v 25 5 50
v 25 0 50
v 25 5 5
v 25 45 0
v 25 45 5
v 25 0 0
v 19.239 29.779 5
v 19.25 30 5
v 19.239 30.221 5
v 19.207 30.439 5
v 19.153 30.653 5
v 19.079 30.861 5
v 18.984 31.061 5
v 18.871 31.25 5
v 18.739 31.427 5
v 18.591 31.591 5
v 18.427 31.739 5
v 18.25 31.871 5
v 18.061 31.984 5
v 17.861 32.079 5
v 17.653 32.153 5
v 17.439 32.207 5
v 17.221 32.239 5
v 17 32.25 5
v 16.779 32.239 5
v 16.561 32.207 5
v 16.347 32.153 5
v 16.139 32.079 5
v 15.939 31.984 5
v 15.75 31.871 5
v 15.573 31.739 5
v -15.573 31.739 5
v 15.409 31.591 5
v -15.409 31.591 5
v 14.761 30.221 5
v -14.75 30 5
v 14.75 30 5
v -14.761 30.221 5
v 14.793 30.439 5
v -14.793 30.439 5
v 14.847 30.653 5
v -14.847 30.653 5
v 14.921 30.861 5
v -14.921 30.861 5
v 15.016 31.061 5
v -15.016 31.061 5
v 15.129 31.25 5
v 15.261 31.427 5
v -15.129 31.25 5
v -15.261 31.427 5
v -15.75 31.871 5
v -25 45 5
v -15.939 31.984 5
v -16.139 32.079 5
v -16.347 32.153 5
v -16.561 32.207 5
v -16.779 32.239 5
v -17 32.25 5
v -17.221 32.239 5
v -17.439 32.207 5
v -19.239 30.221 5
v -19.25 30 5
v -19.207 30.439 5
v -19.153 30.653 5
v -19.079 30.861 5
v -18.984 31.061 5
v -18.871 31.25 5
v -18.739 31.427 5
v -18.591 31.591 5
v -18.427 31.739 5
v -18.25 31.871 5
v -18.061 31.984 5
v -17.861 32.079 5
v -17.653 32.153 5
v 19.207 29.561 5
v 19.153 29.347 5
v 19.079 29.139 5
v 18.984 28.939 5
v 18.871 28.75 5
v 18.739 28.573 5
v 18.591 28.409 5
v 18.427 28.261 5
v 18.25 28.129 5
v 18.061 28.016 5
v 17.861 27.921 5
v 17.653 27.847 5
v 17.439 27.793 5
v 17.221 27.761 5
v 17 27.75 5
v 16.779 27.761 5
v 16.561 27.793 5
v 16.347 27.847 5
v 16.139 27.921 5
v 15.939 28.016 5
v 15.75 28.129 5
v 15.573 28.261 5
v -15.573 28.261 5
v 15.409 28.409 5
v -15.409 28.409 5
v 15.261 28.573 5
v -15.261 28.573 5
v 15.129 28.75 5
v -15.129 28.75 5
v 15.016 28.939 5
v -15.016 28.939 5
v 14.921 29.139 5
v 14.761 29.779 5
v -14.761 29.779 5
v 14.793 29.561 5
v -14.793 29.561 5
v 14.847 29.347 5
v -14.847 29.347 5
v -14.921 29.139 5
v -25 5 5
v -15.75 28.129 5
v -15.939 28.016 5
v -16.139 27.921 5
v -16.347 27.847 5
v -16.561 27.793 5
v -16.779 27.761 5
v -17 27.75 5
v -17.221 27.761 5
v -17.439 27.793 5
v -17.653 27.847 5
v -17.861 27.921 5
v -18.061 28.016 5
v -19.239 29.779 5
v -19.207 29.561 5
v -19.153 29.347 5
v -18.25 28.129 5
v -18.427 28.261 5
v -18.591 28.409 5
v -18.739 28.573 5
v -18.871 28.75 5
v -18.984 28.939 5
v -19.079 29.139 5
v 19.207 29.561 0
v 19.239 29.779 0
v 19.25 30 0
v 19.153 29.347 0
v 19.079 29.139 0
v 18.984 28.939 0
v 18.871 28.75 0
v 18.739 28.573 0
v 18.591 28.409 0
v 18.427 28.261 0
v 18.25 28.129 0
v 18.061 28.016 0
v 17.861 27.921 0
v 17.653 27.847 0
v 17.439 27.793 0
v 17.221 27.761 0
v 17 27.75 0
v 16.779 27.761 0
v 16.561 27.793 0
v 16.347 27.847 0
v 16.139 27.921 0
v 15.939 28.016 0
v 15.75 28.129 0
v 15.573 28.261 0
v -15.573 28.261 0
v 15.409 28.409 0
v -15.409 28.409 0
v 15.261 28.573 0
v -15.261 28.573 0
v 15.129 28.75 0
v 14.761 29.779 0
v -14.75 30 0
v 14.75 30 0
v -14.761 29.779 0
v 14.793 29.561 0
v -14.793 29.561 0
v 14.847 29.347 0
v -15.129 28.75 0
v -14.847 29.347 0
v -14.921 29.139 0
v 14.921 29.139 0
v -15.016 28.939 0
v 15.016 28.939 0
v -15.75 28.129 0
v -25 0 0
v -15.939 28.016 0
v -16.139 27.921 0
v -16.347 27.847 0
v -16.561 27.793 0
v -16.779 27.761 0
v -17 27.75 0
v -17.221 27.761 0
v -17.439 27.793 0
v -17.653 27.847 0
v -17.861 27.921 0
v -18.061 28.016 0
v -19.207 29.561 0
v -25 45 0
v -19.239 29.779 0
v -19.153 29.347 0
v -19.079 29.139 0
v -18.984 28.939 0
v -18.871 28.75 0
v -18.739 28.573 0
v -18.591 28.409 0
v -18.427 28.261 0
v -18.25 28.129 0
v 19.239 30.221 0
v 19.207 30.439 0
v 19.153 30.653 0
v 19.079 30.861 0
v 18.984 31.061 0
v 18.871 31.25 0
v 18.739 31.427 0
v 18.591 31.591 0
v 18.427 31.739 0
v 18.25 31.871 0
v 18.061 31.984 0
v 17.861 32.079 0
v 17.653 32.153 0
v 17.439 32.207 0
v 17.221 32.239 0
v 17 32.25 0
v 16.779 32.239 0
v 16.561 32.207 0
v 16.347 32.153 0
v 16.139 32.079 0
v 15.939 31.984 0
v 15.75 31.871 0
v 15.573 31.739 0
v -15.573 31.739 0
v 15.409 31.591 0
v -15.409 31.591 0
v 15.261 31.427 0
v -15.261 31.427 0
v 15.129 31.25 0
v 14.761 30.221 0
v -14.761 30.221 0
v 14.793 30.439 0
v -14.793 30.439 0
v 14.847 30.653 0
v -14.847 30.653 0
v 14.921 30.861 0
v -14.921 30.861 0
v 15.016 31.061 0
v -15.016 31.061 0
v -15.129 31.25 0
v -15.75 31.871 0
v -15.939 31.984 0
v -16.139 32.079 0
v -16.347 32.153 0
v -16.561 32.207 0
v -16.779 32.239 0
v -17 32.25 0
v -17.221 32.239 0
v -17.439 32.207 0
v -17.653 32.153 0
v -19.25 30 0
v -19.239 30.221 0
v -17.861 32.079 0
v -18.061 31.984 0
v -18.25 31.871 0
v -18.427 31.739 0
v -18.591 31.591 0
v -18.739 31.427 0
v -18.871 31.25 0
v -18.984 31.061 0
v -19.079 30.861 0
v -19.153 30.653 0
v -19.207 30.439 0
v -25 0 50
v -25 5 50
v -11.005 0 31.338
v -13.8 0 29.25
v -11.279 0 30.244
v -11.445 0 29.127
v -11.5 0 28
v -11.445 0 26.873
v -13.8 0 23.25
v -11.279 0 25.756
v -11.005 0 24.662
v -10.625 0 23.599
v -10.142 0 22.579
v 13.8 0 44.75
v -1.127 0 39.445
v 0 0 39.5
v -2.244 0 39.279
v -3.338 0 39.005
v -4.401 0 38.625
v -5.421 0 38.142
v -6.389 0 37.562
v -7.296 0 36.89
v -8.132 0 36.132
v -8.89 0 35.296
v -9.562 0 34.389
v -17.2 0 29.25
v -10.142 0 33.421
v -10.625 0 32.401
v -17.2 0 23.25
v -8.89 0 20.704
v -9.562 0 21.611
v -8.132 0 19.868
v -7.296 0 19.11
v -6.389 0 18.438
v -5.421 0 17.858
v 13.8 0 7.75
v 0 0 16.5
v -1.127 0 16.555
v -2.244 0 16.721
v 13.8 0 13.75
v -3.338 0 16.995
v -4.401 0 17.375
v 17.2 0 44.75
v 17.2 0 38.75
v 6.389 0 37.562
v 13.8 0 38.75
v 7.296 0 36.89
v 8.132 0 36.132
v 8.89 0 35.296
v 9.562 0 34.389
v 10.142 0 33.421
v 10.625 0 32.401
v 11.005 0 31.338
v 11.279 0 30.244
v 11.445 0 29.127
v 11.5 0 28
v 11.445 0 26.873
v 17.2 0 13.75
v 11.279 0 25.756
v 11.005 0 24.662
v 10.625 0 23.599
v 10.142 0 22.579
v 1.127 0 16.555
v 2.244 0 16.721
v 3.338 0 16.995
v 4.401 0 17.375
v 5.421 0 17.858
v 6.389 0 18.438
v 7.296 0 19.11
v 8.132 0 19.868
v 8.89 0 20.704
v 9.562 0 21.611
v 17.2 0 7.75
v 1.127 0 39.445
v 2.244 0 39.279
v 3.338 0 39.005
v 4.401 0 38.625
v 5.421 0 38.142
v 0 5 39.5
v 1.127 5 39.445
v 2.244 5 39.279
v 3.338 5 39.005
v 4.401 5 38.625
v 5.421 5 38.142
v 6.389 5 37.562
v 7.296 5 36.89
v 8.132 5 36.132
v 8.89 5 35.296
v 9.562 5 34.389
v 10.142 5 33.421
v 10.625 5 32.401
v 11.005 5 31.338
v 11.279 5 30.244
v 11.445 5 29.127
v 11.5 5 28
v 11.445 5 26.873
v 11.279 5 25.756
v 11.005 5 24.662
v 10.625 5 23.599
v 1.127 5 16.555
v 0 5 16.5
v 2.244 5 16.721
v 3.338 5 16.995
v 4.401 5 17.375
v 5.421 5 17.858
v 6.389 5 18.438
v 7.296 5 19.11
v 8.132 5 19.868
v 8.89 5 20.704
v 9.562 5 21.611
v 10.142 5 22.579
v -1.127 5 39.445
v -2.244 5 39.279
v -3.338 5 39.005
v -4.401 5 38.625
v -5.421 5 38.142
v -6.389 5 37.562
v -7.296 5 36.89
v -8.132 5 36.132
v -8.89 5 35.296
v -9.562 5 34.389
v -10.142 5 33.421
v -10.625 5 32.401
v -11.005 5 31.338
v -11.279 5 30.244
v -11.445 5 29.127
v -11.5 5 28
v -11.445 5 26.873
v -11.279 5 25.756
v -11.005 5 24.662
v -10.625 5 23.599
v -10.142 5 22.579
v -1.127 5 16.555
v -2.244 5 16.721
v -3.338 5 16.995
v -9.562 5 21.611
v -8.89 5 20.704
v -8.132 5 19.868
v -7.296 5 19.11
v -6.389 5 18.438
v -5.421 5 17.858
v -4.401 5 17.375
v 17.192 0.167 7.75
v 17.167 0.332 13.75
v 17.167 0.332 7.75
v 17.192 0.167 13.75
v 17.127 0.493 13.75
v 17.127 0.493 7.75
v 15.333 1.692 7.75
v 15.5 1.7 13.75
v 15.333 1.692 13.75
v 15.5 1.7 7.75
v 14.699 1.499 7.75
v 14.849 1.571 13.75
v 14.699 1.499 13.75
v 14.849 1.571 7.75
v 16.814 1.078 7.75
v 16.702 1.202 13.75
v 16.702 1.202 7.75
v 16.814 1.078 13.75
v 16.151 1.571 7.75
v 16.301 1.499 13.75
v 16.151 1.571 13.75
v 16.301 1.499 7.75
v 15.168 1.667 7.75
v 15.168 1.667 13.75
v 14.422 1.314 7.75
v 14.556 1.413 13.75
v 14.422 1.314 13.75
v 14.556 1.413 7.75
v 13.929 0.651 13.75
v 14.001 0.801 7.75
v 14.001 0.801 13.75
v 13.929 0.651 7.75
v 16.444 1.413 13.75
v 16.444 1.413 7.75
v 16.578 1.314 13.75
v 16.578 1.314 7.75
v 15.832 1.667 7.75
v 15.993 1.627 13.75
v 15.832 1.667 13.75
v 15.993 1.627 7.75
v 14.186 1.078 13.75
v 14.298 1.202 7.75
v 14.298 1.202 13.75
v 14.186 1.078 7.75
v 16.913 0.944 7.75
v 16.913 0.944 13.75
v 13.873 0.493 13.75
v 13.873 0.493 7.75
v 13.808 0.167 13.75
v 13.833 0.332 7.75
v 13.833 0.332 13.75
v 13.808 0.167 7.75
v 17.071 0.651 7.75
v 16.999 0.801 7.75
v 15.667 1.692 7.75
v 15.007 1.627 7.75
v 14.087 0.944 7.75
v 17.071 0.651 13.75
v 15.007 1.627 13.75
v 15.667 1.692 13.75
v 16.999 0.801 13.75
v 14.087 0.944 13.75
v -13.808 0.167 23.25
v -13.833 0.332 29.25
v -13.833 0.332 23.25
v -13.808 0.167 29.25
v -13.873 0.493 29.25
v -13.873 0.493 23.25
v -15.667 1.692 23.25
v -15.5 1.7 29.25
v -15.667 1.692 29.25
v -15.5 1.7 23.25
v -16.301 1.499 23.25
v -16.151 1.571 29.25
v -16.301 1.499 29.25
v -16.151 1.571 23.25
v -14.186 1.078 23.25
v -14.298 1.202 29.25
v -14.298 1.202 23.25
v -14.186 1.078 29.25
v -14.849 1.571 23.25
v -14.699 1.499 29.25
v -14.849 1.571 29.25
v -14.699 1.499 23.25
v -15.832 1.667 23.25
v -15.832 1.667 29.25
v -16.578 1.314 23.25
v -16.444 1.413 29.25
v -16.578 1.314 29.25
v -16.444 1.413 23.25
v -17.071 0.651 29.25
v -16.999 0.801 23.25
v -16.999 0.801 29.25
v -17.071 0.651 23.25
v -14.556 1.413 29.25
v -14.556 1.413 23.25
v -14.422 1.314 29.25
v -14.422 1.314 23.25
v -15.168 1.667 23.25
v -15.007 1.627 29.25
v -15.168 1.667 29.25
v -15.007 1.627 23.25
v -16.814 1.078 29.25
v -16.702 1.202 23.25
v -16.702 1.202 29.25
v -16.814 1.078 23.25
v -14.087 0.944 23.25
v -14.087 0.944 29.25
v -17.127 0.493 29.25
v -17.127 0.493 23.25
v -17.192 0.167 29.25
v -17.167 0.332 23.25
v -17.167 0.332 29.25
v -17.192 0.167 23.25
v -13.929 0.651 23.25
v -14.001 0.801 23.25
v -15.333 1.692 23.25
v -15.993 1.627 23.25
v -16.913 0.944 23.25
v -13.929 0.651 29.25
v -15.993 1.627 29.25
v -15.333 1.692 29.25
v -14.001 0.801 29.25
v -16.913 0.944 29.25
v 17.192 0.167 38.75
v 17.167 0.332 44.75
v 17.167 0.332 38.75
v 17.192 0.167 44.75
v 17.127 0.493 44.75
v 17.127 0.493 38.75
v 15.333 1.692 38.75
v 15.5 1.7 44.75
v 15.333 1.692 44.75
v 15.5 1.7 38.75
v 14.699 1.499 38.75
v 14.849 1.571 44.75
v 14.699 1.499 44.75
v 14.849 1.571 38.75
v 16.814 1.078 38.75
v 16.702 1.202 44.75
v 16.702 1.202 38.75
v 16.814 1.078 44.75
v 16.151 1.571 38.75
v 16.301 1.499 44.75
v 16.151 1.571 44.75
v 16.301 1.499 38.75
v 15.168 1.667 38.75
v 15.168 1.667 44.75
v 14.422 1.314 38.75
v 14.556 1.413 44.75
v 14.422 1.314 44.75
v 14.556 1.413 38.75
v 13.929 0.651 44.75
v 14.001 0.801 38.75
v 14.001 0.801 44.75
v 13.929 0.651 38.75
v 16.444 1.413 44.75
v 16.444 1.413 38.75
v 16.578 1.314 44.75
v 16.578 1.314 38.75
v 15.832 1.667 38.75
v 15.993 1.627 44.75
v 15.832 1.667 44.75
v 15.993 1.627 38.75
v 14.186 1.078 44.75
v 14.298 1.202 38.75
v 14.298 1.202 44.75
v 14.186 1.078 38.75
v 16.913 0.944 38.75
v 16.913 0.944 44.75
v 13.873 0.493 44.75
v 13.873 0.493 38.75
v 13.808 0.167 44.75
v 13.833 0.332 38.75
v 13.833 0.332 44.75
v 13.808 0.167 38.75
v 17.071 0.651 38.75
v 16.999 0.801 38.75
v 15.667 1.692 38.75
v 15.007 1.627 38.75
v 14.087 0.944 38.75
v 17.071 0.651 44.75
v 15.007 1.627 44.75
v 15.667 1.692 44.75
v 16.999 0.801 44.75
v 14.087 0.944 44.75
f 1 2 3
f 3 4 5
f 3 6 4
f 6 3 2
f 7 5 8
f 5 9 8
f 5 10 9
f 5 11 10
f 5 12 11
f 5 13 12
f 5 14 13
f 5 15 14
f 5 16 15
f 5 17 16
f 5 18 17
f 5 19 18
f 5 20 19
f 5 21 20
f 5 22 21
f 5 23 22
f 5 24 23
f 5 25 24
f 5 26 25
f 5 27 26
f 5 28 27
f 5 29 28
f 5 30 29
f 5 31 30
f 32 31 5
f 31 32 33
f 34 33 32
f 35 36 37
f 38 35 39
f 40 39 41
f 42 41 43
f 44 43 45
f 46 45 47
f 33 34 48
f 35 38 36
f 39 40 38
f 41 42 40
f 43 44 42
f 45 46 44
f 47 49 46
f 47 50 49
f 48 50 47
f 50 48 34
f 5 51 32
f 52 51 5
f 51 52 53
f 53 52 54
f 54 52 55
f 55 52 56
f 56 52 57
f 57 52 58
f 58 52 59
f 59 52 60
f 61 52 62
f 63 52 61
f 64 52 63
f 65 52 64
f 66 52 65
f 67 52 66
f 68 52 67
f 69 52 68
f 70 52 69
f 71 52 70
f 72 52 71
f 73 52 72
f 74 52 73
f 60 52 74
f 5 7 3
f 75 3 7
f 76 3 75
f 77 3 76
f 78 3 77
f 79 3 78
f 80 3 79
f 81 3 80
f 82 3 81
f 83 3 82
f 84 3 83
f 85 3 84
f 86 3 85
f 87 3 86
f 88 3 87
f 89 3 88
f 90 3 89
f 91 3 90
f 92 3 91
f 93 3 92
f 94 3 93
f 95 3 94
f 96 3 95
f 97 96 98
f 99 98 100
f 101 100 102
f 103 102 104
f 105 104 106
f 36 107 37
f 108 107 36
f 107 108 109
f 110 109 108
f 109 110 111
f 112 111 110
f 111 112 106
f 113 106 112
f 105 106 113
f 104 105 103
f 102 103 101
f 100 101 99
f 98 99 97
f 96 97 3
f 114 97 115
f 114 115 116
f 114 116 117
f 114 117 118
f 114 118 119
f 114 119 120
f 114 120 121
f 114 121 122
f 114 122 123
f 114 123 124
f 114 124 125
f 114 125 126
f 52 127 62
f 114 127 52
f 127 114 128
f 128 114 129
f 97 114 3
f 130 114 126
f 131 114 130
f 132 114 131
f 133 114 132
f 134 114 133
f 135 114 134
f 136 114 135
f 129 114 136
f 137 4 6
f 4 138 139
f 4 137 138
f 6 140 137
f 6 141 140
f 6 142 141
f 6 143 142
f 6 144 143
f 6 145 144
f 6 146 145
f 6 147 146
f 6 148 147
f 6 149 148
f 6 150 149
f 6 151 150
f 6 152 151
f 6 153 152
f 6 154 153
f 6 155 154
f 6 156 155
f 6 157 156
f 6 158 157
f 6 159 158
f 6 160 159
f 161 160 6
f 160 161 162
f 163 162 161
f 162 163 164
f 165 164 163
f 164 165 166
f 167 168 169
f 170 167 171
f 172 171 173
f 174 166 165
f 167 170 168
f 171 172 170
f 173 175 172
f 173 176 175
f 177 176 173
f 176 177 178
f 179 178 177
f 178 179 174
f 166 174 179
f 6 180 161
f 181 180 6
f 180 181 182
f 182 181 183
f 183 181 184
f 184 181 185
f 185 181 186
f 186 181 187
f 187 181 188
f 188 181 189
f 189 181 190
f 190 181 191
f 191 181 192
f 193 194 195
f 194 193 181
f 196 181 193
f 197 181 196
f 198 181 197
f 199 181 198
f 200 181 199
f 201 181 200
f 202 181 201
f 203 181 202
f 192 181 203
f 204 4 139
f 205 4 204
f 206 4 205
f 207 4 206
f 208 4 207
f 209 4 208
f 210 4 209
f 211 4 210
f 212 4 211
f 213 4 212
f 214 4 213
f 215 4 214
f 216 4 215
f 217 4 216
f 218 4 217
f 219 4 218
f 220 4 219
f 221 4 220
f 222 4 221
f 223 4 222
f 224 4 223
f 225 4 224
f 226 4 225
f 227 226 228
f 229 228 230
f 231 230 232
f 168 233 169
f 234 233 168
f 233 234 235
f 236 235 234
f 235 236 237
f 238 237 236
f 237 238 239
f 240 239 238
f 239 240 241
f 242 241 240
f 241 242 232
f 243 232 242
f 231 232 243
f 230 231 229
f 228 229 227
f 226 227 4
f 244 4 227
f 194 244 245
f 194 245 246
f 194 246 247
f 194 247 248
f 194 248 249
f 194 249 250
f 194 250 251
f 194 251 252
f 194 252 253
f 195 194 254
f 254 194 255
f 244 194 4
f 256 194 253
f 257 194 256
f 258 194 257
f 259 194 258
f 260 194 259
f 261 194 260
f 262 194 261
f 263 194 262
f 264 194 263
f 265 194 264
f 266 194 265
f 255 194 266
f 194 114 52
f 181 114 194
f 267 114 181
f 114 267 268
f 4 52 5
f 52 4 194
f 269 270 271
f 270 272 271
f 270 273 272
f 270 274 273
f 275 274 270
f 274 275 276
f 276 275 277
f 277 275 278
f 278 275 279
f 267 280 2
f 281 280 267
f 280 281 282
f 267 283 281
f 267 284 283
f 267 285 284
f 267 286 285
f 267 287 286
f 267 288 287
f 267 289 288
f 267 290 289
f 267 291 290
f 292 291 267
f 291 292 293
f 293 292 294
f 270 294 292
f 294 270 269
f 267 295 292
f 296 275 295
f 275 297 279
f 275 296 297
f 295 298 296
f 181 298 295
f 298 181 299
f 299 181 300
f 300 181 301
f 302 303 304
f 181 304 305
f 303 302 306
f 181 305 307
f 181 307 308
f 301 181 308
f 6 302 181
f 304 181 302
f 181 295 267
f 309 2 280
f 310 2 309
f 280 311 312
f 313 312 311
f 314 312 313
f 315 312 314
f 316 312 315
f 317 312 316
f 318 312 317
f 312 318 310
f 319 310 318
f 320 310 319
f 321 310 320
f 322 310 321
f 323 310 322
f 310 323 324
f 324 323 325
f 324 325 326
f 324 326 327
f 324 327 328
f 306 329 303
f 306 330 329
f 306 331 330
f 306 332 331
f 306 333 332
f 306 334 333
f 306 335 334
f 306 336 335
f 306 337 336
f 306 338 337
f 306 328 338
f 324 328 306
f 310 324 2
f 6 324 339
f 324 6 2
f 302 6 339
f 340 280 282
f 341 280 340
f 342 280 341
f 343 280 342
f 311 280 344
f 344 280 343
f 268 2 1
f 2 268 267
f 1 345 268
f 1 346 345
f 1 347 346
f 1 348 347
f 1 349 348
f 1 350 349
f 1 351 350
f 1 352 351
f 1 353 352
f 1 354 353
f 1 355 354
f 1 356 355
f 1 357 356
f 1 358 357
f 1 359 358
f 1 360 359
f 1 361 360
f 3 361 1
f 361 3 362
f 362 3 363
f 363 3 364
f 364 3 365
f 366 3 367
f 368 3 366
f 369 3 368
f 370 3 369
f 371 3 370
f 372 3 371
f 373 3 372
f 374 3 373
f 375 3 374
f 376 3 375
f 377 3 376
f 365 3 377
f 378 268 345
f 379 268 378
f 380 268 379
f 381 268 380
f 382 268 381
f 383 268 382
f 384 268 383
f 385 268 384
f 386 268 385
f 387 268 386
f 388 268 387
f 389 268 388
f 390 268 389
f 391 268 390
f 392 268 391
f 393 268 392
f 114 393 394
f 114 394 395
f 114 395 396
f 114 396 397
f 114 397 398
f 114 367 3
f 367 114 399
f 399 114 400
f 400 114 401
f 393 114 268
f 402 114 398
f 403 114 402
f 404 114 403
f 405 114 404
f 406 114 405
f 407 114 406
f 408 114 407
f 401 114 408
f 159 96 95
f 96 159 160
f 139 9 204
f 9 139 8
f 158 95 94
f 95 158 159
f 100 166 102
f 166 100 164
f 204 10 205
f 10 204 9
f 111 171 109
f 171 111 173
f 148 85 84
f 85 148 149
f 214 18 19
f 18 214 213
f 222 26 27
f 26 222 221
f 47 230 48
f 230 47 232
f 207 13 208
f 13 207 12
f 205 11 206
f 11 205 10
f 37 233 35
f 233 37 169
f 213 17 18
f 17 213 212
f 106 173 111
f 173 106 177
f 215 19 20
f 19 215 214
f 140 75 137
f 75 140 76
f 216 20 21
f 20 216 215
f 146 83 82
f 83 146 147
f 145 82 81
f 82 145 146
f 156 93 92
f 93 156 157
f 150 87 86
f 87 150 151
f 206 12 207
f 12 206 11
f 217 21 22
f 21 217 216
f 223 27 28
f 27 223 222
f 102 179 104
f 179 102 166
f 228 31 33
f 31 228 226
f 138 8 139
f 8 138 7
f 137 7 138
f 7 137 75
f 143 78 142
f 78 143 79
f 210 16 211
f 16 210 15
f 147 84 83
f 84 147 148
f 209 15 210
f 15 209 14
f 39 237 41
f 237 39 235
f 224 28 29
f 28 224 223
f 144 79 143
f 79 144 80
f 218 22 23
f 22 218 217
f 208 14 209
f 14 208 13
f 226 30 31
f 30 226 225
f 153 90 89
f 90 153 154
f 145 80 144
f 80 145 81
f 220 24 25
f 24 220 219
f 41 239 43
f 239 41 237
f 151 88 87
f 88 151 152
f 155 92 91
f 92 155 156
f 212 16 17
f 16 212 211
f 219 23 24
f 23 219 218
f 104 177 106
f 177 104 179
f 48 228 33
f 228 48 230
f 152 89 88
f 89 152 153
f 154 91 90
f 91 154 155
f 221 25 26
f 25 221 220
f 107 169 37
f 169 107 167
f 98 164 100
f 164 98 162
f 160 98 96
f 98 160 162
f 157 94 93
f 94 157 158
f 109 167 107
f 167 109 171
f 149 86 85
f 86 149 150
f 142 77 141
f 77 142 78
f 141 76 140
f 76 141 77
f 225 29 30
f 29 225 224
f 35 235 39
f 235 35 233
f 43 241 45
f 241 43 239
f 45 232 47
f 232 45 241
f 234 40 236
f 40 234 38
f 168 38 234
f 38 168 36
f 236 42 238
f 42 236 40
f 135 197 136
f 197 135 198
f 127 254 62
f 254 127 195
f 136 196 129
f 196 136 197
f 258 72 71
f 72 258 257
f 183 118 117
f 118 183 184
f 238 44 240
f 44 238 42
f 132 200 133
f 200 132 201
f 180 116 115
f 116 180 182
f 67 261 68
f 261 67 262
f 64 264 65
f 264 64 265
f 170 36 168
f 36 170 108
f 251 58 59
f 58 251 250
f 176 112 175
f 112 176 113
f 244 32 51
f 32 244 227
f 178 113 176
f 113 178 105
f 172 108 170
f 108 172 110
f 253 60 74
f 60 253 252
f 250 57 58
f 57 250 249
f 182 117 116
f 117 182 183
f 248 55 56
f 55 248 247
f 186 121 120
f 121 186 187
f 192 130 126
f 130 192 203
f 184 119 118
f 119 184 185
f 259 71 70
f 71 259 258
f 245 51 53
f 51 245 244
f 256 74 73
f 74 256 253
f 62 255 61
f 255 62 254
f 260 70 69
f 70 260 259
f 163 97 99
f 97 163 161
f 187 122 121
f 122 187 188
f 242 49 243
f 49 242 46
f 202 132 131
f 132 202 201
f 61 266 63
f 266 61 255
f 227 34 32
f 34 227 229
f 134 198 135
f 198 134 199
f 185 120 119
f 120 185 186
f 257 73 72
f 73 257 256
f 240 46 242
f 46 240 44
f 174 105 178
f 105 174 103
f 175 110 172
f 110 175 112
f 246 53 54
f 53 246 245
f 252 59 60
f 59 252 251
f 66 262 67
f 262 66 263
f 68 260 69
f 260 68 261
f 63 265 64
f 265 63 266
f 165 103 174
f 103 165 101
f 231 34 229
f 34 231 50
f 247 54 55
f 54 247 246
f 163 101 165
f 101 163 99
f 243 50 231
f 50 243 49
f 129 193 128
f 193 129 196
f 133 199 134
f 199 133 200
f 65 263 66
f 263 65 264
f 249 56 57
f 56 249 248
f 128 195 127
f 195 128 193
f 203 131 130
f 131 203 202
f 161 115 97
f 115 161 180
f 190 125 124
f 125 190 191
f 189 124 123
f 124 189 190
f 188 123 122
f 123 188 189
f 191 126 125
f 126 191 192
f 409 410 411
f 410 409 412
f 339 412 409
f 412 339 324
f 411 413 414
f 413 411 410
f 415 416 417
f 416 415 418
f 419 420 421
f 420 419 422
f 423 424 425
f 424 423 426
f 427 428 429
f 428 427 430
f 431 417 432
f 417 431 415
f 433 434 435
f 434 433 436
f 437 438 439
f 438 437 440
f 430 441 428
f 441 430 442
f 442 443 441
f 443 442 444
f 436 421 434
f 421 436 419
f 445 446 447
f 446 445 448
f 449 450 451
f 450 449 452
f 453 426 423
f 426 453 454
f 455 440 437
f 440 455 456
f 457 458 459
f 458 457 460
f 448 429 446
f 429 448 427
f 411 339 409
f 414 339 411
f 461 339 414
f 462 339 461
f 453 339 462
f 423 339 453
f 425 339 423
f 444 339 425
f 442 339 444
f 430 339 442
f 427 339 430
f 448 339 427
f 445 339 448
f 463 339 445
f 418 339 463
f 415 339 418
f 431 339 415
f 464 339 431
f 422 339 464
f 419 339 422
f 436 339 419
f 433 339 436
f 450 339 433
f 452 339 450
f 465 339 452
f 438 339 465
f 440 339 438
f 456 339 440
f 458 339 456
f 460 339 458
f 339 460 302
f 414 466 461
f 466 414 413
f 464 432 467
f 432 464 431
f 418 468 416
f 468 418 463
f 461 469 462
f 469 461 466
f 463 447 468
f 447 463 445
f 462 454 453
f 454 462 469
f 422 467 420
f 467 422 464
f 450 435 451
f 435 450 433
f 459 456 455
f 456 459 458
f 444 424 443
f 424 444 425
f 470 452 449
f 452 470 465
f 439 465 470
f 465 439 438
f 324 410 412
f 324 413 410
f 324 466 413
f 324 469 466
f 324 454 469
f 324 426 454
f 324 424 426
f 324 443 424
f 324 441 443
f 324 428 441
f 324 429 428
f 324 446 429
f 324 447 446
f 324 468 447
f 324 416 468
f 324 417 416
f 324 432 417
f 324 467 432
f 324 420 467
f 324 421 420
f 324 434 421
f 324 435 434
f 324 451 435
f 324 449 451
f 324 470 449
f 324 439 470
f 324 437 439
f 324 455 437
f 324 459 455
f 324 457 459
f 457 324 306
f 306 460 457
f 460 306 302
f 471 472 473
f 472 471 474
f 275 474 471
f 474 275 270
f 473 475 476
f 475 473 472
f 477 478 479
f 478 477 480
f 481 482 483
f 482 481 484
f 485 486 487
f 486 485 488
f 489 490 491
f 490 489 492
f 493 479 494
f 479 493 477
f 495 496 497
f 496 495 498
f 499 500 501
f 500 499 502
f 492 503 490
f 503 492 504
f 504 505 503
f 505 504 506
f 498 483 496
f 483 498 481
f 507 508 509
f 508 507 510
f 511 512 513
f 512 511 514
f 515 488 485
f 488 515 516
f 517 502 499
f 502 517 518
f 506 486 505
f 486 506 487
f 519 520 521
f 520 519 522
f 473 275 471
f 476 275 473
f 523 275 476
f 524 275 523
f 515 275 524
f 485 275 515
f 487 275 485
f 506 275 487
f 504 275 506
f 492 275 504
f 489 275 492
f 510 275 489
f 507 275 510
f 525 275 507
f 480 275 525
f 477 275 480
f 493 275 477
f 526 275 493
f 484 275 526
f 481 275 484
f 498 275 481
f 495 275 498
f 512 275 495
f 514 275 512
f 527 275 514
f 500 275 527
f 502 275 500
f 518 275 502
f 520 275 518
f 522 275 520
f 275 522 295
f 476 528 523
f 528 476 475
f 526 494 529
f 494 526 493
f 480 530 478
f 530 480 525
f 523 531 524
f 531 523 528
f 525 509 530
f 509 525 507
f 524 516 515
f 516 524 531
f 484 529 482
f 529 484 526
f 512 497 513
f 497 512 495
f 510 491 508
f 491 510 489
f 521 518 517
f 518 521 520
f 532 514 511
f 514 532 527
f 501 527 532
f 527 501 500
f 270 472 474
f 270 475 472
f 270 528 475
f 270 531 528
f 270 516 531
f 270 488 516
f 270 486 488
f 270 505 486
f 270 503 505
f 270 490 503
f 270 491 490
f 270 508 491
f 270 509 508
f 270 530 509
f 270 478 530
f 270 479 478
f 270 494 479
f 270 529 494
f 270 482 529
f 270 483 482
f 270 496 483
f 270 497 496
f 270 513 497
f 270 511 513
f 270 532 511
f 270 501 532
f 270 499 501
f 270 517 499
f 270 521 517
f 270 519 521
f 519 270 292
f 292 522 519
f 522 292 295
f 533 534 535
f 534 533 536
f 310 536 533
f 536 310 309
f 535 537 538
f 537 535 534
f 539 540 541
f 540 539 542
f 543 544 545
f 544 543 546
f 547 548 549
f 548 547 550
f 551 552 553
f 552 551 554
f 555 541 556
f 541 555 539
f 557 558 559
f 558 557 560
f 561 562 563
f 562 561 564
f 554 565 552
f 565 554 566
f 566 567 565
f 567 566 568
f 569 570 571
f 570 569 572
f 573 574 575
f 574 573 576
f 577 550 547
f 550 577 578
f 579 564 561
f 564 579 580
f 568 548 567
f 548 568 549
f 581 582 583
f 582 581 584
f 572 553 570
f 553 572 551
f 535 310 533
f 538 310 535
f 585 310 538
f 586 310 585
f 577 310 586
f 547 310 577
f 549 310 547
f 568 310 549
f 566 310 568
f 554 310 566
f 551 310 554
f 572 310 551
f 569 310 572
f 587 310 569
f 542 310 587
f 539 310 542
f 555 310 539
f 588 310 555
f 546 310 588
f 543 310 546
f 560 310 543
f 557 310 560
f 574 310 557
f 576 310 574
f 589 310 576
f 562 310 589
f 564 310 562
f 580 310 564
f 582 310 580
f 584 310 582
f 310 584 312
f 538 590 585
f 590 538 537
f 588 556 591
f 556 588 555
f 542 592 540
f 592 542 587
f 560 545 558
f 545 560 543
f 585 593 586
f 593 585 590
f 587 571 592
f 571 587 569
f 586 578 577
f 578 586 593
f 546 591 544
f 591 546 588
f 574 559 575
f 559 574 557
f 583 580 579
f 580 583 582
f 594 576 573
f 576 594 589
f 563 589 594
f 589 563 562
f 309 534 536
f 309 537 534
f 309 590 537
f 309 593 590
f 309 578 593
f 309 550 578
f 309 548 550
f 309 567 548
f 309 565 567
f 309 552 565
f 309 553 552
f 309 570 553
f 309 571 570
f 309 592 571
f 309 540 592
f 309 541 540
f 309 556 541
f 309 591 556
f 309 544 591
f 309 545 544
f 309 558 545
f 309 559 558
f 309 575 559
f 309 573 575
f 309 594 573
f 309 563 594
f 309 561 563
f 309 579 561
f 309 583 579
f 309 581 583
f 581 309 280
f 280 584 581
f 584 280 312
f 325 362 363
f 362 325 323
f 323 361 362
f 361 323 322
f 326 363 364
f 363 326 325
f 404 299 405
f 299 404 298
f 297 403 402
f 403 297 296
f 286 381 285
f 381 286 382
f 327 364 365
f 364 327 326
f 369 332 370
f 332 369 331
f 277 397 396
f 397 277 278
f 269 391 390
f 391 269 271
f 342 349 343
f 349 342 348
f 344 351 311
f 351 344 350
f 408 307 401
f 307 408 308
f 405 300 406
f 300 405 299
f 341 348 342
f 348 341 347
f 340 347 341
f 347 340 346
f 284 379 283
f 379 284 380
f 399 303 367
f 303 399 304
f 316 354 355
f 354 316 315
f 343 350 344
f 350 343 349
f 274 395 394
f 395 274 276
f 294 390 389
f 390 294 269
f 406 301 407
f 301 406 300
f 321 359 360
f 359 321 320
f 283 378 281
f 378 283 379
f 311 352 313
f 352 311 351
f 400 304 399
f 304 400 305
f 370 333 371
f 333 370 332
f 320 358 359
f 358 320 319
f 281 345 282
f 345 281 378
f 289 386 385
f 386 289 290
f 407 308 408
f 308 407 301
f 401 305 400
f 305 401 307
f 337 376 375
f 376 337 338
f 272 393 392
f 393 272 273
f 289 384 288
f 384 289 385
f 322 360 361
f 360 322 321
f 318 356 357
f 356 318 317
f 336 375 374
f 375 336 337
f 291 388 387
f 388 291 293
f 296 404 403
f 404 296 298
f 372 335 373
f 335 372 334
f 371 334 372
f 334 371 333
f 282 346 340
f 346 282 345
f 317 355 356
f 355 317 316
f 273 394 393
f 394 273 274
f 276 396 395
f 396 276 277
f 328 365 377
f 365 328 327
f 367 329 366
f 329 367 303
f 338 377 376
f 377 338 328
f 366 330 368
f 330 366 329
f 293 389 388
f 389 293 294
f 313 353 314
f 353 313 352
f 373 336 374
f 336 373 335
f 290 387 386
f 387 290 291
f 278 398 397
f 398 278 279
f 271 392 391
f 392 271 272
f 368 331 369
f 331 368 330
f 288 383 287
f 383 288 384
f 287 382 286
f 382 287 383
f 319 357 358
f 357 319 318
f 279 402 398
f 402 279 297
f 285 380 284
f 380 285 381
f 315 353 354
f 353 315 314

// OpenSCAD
// L-shaped mounting bracket for NEMA 17 stepper motor
// Print orientation: base plate on bed (z = 0), motor plate builds upward (+Z)

// ---------------- Parameters ----------------
base_x0      = -25;   // base plate: x start
base_x1      = 25;    // base plate: x end (2 * 25 mm)
base_y0      = 0;     // base plate: y start
base_y1      = 45;    // base plate: y end
base_z0      = 0;     // base plate: z start
base_z1      = 5;     // base plate: z end

hole_x       = -17;   // M4 through-hole x position (left)
hole_y       = 30;    // M4 through-hole y position
hole_d       = 4.5;   // M4 hole diameter

motor_x0     = -25;   // motor plate: x start
motor_x1     = 25;    // motor plate: x end (2 * 25 mm)
motor_y0     = 0;     // motor plate: y start
motor_y1     = 5;     // motor plate: y end
motor_z0     = 0;     // motor plate: z start
motor_z1     = 50;    // motor plate: z end (50 mm tall)

boss_h       = 23;    // motor centring boss hole depth (along Y)
boss_x       = 0;     // boss hole centre x
boss_z       = 28;    // boss hole centre z

screw_d      = 3.4;   // M3 screw hole diameter
screw_pitch  = 31;    // square pattern side length
screw_count  = 4;     // number of screw holes

gusset_t     = 5;     // gusset thickness (X)
gusset_leg   = 20;    // right triangle leg length (Y and Z)
gusset_x0    = -25;   // gusset left edge x
gusset_x1    = -20;   // gusset left end x
gusset_y1    = 5;     // gusset right-angle corner y
gusset_z1    = 5;     // gusset right-angle corner z

eps          = 0.5;   // cutter overshoot past faces

$fn = 64;             // curve resolution

// ---------------- Model ----------------
difference() {
    union() {
        // Base plate
        translate([base_x0, base_y0, base_z0])
            cube([base_x1 - base_x0, base_y1 - base_y0, base_z1 - base_z0]);

        // Motor plate (overlaps base slightly for a solid union)
        translate([motor_x0, motor_y0, motor_z0])
            cube([motor_x1 - motor_x0, motor_y1 - motor_y0, motor_z1 - motor_z0]);

        // Gussets: right triangles in YZ plane, extruded along X
        for (sx = [-1, 1]) {
            x_pos = sx > 0 ? gusset_x1 : gusset_x0;
            translate([x_pos, 0, 0])
                rotate([90, 0, 0])
                    linear_extrude(height = gusset_t)
                        polygon(points = [
                            [x_pos == gusset_x0 ? gusset_x0 - 1 : x_pos, gusset_y1],
                            [x_pos == gusset_x0 ? gusset_x0 - 1 : x_pos, gusset_z1],
                            [gusset_y1, gusset_z1]
                        ]);
        }
    }

    // Base plate M4 through-holes
    for (hx = [-1, 1])
        translate([hx * hole_x, hole_y, -eps])
            cylinder(d = hole_d, h = base_z1 - base_z0 + 2 * eps);

    // Motor boss hole (along Y)
    translate([boss_x, -eps, boss_z])
        rotate([-90, 0, 0])
            cylinder(d = boss_h, h = motor_y1 - motor_y0 + 2 * eps);

    // M3 screw holes on square pattern
    for (i = [0 : screw_count - 1]) {
        x = (i % 2 - 0.5) * screw_pitch;
        z = (i / 2 - 0.25) * screw_pitch;
        translate([x, 0, z])
            cylinder(d = screw_d, h = motor_y1 - motor_y0 + 2 * eps);
    }
}
